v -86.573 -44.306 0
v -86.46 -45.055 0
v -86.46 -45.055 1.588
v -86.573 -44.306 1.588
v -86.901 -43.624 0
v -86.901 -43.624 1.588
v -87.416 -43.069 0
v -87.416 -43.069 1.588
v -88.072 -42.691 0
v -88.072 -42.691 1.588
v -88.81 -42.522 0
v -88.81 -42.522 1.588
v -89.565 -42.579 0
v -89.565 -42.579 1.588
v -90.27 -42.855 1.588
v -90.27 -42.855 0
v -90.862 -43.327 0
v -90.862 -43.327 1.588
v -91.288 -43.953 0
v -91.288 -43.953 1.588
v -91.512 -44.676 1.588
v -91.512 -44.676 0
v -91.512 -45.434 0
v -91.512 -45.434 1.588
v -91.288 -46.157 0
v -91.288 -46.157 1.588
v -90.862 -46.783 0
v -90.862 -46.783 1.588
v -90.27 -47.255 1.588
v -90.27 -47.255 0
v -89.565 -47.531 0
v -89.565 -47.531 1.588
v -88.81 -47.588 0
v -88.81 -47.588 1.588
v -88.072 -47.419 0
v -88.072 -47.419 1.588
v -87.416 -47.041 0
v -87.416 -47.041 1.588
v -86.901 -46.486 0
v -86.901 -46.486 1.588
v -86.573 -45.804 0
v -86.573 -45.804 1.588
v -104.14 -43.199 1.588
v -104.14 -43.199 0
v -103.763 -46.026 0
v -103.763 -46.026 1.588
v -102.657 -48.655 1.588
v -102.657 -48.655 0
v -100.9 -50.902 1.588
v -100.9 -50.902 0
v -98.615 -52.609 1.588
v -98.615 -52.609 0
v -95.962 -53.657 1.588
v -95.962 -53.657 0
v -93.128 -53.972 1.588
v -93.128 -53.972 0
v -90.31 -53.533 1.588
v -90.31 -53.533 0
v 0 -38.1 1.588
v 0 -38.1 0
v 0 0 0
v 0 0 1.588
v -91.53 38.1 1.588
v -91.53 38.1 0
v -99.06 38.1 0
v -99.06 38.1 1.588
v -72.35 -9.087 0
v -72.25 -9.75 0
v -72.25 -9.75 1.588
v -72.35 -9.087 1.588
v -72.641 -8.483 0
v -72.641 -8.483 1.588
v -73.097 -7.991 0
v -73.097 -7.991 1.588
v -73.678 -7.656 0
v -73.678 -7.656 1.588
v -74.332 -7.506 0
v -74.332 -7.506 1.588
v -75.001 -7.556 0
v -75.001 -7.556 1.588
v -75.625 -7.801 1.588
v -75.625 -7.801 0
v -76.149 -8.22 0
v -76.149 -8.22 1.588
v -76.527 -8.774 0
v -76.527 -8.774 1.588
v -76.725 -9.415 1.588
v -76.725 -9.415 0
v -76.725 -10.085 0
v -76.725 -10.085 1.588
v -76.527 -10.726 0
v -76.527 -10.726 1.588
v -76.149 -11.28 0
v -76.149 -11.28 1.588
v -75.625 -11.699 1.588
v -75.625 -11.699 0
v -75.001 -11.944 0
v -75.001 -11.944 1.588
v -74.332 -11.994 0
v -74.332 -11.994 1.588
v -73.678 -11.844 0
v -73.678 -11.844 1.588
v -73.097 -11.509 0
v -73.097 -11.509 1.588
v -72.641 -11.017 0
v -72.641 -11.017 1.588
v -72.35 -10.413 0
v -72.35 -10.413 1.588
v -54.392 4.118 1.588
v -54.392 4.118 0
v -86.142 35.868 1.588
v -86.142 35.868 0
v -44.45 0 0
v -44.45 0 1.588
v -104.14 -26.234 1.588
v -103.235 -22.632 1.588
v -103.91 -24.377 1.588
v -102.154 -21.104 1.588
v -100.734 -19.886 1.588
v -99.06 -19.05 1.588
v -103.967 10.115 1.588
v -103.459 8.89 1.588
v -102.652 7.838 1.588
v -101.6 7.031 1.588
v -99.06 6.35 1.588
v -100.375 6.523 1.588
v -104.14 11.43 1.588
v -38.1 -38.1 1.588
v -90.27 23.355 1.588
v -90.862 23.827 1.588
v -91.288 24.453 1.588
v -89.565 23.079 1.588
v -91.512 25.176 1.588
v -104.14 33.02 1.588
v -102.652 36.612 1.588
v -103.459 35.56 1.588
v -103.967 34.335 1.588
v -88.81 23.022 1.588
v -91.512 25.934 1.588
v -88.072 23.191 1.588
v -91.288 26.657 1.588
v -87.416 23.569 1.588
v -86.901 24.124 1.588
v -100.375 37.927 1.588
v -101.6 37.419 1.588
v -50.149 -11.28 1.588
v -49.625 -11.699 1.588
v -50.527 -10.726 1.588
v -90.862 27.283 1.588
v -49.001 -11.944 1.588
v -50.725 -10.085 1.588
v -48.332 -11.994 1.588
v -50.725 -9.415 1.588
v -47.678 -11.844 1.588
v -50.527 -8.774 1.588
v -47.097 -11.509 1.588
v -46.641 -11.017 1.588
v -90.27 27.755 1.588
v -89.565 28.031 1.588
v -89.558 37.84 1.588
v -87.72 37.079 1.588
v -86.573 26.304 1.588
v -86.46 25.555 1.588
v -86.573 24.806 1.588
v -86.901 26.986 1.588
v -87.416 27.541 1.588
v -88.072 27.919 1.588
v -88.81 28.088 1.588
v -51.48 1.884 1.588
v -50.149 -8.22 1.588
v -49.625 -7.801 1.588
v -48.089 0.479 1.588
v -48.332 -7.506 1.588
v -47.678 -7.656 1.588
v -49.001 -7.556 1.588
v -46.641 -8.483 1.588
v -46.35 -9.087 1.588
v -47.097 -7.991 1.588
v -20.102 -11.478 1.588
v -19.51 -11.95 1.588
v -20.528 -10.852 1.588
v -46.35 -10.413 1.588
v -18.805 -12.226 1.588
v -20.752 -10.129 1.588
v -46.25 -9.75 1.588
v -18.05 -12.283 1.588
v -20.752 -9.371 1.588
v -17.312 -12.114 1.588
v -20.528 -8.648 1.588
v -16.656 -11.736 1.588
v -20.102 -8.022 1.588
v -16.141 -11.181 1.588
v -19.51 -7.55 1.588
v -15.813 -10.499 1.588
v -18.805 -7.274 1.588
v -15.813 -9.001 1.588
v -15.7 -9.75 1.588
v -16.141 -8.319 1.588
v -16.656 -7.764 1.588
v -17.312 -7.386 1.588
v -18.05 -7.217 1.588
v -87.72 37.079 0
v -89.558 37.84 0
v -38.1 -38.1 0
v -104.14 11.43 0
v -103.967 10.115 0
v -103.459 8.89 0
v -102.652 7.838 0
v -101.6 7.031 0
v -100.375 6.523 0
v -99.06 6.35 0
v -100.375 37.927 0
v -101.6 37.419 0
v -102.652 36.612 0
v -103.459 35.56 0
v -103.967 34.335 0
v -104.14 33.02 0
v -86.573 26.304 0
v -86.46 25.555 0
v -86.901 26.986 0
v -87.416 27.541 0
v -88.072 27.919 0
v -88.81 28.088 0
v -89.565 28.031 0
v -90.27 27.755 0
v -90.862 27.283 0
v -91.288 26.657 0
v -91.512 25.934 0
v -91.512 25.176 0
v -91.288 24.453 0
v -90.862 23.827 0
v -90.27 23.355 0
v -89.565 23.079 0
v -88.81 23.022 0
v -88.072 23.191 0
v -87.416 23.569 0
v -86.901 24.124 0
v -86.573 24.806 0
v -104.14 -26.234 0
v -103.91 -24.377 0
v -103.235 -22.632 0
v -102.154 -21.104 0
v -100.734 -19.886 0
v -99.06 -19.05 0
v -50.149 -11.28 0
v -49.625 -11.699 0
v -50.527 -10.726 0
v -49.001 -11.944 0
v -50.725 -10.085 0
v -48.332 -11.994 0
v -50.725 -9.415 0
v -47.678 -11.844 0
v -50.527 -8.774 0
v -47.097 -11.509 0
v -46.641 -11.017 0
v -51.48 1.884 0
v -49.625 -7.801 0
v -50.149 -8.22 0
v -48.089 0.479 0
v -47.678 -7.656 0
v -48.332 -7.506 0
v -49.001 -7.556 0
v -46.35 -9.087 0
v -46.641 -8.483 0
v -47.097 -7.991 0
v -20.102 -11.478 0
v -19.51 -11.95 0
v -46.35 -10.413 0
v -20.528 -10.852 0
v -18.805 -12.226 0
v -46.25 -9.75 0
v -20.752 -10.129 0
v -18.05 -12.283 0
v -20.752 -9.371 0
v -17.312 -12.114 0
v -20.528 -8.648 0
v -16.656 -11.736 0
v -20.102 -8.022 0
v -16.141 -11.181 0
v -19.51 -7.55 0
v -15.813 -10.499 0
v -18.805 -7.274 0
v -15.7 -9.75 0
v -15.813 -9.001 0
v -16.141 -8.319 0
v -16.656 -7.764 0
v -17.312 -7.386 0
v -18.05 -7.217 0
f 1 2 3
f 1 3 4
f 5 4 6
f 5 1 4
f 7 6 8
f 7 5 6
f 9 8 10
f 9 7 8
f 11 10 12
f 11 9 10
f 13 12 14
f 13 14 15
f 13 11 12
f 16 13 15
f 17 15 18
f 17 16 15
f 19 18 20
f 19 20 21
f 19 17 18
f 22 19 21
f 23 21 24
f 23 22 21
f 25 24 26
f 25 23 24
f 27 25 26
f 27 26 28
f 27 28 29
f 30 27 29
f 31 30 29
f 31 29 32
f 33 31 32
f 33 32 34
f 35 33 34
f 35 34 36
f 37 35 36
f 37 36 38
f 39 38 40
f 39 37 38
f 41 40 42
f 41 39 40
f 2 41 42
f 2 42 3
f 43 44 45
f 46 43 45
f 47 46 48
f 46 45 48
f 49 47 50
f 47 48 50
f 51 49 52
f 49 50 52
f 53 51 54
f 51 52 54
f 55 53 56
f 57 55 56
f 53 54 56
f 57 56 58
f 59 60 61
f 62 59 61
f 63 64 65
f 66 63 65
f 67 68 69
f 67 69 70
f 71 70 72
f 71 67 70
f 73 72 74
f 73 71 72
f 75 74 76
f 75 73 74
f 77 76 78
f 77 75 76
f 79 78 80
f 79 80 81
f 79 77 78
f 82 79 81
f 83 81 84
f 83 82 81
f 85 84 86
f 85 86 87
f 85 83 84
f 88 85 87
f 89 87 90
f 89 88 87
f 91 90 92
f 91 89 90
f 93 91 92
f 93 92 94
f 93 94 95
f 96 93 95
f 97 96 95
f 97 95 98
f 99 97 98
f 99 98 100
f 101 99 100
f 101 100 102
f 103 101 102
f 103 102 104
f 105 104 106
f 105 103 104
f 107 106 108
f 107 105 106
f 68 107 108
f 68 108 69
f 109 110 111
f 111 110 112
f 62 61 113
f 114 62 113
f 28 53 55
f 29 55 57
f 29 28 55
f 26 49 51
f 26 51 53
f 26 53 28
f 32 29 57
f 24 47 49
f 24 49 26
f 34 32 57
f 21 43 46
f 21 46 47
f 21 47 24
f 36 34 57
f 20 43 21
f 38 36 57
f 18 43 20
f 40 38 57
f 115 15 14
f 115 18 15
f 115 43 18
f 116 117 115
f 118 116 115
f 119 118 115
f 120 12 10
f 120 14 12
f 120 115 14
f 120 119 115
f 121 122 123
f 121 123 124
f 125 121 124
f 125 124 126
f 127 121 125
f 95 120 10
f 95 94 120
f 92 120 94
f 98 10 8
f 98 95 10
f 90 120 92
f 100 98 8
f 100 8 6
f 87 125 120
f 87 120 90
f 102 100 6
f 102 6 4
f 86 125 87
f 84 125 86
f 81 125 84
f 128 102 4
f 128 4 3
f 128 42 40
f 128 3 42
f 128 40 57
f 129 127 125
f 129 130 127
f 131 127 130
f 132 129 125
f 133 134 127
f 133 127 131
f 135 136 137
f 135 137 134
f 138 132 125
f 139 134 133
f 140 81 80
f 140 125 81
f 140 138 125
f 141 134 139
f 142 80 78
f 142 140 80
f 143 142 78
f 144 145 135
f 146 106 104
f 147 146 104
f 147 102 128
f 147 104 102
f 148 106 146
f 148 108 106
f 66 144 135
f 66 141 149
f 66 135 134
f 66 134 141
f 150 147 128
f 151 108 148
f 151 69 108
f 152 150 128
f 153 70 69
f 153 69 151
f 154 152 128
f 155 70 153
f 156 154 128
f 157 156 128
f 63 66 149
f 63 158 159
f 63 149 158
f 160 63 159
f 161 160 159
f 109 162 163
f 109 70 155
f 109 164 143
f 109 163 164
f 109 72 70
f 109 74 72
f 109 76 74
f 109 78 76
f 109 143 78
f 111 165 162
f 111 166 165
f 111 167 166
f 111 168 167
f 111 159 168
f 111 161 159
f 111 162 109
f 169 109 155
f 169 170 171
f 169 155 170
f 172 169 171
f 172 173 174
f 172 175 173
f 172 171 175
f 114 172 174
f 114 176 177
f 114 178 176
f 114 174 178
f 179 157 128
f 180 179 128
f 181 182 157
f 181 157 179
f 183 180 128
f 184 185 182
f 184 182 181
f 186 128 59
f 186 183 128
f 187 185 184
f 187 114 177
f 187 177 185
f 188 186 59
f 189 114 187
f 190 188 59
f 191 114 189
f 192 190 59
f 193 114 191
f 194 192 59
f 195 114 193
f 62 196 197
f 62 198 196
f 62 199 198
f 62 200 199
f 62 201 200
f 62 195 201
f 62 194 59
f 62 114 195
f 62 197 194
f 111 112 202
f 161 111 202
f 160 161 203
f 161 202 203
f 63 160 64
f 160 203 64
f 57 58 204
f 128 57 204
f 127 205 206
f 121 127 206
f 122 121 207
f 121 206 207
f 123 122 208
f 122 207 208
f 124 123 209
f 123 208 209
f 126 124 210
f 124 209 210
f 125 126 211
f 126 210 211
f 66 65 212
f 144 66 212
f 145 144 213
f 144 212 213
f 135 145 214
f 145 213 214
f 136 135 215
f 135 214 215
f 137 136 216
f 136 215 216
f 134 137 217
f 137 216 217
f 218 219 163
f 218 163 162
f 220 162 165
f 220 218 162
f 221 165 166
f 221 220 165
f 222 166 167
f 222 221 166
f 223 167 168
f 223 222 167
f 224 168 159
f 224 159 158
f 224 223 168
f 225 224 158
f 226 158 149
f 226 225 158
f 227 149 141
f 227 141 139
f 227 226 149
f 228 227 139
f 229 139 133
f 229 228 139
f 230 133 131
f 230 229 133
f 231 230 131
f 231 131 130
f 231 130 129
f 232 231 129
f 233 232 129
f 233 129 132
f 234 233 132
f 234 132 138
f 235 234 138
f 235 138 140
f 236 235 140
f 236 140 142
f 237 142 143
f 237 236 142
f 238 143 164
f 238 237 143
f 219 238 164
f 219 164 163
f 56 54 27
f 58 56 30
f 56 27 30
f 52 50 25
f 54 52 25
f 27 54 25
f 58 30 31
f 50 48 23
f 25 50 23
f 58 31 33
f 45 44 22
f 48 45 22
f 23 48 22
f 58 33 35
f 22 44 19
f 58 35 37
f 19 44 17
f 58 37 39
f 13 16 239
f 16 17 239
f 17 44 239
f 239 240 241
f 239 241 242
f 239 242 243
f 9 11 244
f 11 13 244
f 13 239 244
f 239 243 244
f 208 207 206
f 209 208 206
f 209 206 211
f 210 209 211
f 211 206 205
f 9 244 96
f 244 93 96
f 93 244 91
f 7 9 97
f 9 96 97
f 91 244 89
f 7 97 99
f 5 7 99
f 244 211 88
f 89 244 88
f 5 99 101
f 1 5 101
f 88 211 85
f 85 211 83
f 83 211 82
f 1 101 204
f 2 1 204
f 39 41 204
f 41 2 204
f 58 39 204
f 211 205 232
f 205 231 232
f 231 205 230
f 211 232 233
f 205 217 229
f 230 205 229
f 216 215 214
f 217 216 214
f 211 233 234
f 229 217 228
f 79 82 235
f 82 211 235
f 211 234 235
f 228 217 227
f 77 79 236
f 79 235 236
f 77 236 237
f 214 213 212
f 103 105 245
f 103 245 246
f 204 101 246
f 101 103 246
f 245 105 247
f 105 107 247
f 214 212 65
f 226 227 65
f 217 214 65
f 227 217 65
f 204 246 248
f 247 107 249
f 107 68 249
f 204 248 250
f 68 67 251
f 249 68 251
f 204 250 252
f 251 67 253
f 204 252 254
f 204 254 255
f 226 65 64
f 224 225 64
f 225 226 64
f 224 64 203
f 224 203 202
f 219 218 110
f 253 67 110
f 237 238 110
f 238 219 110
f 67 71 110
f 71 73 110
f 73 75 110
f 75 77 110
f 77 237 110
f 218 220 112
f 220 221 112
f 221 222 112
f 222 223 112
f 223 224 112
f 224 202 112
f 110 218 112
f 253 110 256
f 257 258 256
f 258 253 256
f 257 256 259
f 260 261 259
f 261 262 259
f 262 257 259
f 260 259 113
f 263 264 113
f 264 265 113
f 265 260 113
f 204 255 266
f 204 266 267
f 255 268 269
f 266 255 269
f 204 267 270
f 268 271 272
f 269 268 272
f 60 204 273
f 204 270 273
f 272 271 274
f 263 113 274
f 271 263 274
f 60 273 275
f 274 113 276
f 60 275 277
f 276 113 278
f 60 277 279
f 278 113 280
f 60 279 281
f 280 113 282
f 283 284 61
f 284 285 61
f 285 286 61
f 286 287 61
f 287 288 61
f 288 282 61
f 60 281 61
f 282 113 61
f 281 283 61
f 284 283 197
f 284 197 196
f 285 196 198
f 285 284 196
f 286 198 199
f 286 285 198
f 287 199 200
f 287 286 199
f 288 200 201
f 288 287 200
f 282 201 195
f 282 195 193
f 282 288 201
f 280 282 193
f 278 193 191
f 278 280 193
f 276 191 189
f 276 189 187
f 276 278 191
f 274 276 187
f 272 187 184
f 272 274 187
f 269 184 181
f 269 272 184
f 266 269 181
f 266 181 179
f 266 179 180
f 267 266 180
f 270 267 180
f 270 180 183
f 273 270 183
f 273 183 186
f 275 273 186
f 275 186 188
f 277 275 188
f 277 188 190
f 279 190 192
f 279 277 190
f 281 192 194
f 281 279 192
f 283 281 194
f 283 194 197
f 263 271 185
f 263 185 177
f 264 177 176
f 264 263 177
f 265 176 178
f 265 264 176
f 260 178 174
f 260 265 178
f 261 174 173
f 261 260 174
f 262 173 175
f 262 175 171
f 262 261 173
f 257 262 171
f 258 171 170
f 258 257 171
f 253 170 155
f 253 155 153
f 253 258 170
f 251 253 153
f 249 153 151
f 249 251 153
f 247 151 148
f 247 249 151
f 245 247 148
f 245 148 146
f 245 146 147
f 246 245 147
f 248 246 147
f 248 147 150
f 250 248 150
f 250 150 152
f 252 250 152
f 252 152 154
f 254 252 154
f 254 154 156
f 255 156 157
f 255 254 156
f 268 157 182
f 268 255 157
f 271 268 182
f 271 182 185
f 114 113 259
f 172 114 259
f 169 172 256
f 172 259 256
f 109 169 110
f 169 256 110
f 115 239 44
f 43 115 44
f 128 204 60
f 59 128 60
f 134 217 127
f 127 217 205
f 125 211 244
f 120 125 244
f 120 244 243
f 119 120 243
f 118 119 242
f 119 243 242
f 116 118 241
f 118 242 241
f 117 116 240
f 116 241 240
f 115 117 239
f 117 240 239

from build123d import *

# Parameters (mm, degrees)
SKETCH1_R           = 2.54
SKETCH1_R_2         = 2.25
BOSS_EXTRUDE1_DEPTH = 1.5875


with BuildPart() as part:
    # Sketch1 → Boss-Extrude1 (new body)
    with BuildSketch(Plane.XY):
        with BuildLine():
            Line((0, 0), (-44.45, 0))
            ThreePointArc((-44.45, 0), (-49.830627072, 1.070273269), (-54.392102448, 4.118153673))
            Line((-54.392102448, 4.118153673), (-86.142102448, 35.868153673))
            ThreePointArc((-86.142102448, 35.868153673), (-88.614208366, 37.519962038), (-91.530256121, 38.1))
            Line((-91.530256121, 38.1), (-99.06, 38.1))
            ThreePointArc((-99.06, 38.1), (-102.652102448, 36.612102448), (-104.14, 33.02))
            Line((-104.14, 33.02), (-104.14, 11.43))
            ThreePointArc((-104.14, 11.43), (-102.652102448, 7.837897552), (-99.06, 6.35))
            Line((-99.06, 6.35), (-99.06, -19.05))
            ThreePointArc((-99.06, -19.05), (-102.741703947, -21.834795846), (-104.14, -26.234204897))
            Line((-104.14, -26.234204897), (-104.14, -43.199318572))
            ThreePointArc((-104.14, -43.199318572), (-99.814124397, -51.831543955), (-90.309725681, -53.532990354))
            Line((-90.309725681, -53.532990354), (-38.1, -38.1))
            Line((-38.1, -38.1), (0, -38.1))
            Line((0, -38.1), (0, 0))
        make_face()
        with Locations((-89, 25.555)):
            Circle(SKETCH1_R, mode=Mode.SUBTRACT)
        with Locations((-89, -45.055)):
            Circle(SKETCH1_R, mode=Mode.SUBTRACT)
        with Locations((-18.24, -9.75)):
            Circle(SKETCH1_R, mode=Mode.SUBTRACT)
        with Locations((-74.5, -9.75)):
            Circle(SKETCH1_R_2, mode=Mode.SUBTRACT)
        with Locations((-48.5, -9.75)):
            Circle(SKETCH1_R_2, mode=Mode.SUBTRACT)
    extrude(amount=BOSS_EXTRUDE1_DEPTH)


solid = part.part
